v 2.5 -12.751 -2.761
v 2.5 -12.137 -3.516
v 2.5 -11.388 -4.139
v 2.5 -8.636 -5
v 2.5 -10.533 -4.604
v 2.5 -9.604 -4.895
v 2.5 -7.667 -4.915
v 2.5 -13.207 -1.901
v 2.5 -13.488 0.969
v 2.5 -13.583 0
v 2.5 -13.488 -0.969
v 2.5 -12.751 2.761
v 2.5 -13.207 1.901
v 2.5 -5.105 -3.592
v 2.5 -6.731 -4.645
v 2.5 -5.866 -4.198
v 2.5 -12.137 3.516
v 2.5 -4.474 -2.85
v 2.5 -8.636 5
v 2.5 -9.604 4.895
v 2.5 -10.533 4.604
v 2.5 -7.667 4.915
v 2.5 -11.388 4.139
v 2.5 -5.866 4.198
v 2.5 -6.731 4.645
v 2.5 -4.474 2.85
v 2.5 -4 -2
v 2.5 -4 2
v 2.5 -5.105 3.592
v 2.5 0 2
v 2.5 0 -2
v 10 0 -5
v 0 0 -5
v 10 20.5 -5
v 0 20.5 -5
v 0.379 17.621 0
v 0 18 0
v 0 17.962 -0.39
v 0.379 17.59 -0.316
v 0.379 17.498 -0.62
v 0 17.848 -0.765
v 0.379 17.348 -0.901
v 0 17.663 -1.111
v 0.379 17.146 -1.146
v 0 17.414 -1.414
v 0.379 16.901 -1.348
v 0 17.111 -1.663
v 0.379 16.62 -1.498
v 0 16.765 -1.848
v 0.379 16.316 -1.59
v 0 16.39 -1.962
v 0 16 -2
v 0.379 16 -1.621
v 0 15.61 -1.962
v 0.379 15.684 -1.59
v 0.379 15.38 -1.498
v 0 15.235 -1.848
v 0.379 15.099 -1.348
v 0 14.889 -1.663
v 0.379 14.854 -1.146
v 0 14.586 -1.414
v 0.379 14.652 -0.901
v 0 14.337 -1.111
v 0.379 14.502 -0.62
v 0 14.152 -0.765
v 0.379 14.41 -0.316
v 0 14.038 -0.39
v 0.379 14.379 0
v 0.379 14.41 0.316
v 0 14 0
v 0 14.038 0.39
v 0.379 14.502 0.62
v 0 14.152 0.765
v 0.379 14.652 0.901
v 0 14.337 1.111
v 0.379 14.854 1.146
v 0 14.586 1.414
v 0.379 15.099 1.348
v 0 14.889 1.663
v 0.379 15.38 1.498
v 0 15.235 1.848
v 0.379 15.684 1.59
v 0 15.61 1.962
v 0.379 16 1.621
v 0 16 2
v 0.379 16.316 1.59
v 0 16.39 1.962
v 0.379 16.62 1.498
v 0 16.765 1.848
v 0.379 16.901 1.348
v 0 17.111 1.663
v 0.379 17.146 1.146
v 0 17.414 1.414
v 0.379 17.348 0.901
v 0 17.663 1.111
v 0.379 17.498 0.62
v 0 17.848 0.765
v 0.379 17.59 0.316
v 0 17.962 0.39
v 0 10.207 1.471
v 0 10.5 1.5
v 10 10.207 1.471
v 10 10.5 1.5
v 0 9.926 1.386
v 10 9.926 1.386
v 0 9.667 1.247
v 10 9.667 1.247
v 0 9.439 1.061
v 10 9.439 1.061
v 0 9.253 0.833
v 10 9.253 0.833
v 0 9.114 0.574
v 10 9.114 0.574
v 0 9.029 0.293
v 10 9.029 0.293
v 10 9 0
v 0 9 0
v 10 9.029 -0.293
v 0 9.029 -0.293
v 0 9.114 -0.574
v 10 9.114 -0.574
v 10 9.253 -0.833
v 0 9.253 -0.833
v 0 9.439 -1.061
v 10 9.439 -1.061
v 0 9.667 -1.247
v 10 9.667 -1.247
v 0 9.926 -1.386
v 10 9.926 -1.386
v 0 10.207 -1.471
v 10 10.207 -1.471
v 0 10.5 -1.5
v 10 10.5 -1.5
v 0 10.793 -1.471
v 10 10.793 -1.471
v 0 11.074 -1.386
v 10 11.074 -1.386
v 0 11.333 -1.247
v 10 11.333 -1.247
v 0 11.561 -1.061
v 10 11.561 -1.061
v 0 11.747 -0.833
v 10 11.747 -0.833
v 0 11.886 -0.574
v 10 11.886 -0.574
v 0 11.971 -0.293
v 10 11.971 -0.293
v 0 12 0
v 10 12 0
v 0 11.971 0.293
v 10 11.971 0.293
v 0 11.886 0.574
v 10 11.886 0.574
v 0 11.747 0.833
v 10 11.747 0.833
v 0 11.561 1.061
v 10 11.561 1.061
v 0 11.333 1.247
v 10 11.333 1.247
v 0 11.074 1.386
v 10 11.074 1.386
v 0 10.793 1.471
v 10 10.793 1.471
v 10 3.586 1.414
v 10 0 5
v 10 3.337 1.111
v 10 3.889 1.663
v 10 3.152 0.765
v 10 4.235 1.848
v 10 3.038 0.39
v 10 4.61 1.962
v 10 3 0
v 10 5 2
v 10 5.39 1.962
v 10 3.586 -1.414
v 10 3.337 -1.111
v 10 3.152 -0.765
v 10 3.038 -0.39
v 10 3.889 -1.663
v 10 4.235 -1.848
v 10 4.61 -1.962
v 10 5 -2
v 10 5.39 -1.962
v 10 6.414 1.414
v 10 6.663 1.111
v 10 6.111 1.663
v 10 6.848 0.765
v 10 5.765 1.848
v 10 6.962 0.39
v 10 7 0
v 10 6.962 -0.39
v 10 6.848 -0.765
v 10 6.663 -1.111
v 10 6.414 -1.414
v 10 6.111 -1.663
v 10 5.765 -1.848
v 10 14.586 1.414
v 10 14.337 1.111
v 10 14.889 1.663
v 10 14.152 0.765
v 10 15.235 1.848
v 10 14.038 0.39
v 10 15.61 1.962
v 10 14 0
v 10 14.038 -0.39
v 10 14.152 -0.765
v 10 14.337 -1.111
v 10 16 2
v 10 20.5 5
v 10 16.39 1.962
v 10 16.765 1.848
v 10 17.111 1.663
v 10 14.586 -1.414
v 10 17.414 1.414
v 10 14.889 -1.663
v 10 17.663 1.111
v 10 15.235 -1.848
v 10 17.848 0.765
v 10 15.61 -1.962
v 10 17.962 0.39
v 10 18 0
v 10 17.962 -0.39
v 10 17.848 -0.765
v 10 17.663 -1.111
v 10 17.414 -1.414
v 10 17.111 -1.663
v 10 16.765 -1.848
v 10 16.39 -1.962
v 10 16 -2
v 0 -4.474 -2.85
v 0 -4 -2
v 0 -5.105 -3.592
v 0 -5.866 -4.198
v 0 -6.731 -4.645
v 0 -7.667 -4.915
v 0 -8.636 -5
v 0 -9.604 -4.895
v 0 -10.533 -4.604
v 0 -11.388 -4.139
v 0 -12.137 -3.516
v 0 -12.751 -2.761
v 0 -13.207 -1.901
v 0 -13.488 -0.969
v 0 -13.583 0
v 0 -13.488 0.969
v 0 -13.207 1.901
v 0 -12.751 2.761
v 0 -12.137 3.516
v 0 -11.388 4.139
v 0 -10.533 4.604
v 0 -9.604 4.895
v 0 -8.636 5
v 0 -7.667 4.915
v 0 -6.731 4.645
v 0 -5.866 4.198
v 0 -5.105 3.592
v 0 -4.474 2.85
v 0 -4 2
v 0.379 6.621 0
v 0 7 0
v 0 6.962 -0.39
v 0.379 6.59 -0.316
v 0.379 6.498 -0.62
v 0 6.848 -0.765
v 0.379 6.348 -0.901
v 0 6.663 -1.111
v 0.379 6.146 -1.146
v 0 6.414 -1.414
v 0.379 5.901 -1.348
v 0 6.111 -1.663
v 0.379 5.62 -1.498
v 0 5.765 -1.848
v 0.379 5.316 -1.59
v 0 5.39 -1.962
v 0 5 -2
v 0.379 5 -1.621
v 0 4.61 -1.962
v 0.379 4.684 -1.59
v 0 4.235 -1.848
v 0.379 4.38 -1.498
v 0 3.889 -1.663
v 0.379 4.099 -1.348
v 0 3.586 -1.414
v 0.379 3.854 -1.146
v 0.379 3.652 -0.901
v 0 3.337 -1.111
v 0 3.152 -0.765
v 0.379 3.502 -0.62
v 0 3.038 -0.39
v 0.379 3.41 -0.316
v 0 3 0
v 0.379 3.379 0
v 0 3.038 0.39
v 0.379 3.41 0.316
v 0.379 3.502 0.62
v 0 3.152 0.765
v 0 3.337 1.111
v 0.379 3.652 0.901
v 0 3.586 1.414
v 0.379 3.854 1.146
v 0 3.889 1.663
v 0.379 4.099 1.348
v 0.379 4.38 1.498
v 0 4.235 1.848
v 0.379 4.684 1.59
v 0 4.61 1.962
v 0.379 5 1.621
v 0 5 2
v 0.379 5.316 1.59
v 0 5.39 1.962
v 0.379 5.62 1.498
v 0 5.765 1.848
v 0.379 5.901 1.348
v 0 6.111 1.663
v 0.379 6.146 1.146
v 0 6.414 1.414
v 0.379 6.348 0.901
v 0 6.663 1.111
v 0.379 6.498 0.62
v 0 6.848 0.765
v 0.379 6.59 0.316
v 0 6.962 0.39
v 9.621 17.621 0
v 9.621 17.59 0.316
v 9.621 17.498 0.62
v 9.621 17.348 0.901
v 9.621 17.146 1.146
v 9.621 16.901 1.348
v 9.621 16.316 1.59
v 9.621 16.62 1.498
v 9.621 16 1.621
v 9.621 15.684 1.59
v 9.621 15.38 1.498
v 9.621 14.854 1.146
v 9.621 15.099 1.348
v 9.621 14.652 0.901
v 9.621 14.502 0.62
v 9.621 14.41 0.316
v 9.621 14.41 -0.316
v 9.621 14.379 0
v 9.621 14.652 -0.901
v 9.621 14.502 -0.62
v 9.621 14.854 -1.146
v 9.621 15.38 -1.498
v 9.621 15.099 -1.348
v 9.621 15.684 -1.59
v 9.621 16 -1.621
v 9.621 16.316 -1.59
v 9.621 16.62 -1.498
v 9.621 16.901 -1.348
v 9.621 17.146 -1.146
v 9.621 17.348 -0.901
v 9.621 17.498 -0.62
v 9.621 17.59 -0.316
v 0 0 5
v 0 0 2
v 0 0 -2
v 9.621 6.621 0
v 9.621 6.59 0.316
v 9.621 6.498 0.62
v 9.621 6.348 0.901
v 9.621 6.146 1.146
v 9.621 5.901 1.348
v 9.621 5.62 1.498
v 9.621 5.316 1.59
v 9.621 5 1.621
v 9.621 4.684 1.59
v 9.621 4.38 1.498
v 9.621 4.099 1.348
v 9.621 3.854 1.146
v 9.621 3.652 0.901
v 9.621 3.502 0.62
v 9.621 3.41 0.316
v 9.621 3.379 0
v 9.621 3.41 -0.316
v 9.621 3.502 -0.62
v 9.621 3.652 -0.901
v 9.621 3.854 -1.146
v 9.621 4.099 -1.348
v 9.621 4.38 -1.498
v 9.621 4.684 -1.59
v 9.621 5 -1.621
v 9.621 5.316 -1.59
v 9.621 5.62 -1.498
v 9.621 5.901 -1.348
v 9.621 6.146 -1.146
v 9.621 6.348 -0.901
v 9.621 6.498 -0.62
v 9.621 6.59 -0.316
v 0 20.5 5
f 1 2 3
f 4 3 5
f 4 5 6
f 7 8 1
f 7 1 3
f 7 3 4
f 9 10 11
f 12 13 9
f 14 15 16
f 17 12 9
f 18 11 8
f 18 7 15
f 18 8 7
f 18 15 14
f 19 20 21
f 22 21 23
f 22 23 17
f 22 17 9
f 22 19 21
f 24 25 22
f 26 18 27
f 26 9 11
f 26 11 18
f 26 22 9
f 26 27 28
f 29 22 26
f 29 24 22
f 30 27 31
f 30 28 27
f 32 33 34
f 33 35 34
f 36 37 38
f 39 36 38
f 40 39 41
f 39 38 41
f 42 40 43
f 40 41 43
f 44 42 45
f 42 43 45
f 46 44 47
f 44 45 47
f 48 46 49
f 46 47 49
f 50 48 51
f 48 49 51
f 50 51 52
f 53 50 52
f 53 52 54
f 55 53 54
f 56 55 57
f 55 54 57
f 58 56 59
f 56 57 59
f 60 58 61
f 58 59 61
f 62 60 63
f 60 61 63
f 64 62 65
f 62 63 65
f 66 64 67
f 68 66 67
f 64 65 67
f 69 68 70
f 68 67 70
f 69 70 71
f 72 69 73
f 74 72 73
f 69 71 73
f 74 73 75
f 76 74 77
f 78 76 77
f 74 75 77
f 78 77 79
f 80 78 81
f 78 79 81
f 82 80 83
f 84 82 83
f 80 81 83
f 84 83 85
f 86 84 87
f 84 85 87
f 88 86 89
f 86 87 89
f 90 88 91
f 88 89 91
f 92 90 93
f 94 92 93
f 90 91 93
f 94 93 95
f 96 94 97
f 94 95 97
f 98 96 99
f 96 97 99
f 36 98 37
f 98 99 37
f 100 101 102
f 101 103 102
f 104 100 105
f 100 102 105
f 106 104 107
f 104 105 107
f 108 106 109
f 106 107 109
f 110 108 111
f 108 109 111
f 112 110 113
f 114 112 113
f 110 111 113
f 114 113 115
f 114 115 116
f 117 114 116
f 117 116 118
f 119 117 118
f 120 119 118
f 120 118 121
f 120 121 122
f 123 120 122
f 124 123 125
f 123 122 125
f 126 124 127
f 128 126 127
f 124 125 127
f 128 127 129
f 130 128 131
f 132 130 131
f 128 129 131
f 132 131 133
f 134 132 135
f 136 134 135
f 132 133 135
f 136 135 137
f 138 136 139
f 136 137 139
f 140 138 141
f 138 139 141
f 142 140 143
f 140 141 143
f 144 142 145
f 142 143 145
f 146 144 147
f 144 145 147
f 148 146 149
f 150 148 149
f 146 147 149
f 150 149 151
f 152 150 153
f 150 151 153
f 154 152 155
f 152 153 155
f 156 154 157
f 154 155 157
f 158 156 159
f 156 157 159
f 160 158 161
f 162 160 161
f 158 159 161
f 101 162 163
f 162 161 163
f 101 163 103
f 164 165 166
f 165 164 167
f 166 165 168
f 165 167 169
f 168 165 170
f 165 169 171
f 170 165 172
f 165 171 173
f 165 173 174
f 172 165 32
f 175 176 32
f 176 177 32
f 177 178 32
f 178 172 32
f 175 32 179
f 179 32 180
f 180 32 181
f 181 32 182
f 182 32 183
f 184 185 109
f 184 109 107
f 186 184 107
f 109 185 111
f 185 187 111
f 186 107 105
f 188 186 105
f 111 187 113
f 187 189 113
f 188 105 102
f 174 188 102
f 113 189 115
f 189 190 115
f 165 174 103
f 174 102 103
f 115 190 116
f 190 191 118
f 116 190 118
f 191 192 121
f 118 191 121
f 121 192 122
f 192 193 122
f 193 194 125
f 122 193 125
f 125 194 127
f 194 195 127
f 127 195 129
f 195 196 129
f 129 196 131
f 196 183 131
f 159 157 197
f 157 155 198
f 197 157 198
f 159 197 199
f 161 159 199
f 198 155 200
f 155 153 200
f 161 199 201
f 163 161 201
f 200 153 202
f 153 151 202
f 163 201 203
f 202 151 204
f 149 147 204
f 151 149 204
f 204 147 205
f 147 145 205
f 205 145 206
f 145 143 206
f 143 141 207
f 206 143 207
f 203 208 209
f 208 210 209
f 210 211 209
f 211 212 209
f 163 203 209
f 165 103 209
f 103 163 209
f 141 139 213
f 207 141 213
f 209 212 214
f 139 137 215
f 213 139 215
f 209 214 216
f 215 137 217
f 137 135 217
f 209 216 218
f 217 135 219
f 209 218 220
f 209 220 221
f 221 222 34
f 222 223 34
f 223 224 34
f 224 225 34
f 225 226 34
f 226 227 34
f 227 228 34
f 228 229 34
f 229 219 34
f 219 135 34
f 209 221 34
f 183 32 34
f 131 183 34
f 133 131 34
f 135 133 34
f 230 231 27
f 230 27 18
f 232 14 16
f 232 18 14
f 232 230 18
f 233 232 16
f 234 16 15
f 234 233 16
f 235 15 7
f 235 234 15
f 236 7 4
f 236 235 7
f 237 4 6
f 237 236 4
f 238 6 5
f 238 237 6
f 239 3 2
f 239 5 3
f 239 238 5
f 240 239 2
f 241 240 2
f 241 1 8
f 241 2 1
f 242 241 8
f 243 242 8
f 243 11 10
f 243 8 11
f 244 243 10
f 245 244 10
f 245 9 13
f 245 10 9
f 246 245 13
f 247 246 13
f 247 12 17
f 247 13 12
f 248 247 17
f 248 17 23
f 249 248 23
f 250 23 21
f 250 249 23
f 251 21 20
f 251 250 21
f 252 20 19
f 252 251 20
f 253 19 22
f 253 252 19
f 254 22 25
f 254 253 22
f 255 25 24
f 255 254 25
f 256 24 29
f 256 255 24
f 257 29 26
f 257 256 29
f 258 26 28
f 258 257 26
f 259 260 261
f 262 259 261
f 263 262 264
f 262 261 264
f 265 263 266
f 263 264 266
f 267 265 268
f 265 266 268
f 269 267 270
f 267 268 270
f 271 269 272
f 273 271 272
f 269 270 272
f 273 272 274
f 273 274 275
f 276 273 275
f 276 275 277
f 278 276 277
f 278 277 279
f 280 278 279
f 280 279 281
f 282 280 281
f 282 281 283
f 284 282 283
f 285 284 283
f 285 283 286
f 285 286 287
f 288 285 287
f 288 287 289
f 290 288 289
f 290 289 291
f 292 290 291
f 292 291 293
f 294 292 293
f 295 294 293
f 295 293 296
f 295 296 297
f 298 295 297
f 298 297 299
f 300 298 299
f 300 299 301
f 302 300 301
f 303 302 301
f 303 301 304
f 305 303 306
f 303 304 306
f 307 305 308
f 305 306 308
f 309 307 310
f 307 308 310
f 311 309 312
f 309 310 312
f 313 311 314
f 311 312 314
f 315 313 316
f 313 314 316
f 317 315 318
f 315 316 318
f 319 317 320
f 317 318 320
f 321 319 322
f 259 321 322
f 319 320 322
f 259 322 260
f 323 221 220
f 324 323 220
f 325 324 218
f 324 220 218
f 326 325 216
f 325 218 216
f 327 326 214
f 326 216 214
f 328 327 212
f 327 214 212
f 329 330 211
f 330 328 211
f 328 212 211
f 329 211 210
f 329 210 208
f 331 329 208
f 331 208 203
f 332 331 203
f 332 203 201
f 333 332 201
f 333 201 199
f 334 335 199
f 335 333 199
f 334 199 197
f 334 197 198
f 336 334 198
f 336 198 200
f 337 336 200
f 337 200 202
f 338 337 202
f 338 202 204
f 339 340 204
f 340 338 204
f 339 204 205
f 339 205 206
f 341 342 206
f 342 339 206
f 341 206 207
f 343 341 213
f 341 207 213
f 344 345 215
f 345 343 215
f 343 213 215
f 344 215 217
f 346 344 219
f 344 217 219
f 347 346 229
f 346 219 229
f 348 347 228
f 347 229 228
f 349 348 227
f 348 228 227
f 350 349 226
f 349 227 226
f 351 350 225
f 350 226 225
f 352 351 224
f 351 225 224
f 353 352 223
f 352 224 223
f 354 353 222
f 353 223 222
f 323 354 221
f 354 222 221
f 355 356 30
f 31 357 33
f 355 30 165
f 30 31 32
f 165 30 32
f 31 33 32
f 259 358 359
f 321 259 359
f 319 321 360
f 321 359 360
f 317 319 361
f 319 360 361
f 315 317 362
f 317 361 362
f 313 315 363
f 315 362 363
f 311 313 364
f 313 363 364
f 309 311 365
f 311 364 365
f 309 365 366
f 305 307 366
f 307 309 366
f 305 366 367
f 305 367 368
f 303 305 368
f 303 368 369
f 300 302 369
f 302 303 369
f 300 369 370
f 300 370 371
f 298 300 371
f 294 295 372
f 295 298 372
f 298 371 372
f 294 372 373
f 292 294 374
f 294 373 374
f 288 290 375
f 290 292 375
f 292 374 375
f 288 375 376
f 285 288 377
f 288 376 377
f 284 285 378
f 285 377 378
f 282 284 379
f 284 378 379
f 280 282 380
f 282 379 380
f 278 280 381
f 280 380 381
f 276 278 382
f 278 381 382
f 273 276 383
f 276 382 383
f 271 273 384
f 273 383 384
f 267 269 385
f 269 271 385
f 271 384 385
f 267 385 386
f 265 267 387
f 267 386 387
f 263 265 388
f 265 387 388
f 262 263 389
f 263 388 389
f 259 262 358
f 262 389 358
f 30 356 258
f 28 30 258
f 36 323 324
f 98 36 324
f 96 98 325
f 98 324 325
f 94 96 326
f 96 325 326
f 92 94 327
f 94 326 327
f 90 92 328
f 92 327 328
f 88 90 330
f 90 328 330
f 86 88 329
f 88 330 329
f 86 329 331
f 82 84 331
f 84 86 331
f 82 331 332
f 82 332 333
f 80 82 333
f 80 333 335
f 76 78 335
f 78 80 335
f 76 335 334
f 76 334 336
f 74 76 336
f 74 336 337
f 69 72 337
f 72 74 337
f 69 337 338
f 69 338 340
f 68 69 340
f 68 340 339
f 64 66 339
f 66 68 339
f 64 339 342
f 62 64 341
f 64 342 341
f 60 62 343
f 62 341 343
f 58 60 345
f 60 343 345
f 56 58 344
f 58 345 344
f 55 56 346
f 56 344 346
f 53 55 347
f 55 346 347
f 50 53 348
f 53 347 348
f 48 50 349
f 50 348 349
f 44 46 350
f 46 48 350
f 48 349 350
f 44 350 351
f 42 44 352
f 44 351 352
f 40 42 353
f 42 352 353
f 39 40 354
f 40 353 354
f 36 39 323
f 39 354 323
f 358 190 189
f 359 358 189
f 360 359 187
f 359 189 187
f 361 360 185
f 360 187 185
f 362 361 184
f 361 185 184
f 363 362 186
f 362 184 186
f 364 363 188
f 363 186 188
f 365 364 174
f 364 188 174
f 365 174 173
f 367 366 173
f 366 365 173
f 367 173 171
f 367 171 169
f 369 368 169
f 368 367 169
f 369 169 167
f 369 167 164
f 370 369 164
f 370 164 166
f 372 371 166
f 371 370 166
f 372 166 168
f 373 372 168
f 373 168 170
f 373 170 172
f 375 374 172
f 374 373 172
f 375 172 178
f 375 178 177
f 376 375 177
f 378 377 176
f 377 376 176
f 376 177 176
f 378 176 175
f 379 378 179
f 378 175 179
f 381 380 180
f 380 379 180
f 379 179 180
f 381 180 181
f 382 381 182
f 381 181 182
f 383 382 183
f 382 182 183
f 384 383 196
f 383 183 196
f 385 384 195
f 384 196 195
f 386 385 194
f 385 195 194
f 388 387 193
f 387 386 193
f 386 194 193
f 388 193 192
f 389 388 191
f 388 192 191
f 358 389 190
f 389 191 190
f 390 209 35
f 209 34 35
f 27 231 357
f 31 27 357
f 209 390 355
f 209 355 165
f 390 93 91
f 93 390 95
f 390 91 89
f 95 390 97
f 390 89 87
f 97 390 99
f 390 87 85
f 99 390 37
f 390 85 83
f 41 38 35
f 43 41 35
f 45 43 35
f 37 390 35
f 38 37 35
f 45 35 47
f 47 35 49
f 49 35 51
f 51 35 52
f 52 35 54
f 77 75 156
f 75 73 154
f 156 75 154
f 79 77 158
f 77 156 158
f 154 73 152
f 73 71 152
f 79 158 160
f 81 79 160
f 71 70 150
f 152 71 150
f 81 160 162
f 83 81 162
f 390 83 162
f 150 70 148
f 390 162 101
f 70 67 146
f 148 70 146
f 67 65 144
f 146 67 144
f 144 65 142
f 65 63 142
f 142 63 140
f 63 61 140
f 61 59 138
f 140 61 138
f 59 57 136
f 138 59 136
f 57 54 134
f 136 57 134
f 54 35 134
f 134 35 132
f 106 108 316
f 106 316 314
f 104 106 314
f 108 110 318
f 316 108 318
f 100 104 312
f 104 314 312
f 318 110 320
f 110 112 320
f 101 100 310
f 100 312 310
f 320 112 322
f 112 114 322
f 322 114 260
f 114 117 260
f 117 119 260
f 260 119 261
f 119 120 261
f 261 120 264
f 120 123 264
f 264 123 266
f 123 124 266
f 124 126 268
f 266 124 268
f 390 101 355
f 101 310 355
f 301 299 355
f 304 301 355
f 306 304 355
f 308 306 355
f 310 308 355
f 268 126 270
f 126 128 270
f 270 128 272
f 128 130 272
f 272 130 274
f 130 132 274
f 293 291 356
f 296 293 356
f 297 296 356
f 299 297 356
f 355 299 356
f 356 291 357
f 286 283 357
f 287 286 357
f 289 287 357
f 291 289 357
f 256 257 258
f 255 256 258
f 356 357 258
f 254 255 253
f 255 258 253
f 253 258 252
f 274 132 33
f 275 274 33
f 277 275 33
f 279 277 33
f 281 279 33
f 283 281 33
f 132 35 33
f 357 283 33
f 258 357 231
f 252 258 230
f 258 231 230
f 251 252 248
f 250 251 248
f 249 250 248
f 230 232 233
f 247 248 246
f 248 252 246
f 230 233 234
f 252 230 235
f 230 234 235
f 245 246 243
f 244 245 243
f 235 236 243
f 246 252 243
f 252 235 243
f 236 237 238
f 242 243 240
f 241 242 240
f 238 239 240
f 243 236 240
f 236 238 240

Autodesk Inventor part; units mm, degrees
sketch "Sketch_11" plane through (0, 0, 0) normal (0, 0, 1) x (1, 0, 0)
  line L0 (0, 0) -> (10, 0)
  line L1 (10, 0) -> (10, 20.5)
  line L2 (10, 20.5) -> (0, 20.5)
  line L3 (0, 20.5) -> (0, 0)
extrude "Extrusion1" add sketch "Sketch_11" along normal mid plane 10
sketch "Sketch2" plane through (0, 0, 5) normal (-1, 0, 0) x (0, 0, 1)
  point P0 (-5, 10.5)
hole "Hole1" at (0, 10.5, 0) direction (1, 0, 0) diameter 3 depth 10
sketch "Sketch_16" plane through (0, 0, 0) normal (0, 0, 1) x (1, 0, 0)
  line L0 (10, 5) -> (0, 5)
  line L1 (0, 5) -> (0, 7)
  line L2 (0, 7) -> (0.379, 6.621)
  line L3 (0.379, 6.621) -> (9.621, 6.621)
  line L4 (9.621, 6.621) -> (10, 7)
  line L5 (10, 7) -> (10, 5)
  line L6 (10, 5) -> (0, 5)
revolve "Revolution1" cut sketch "Sketch_16" angle 360 about axis through (10, 5, 0) along (-1, 0, 0)
thread "Thread1" size "M4x0.7" class "6H" standard "ISO Metric profile" full length
sketch "Sketch_17" plane through (0, 0, 0) normal (0, 0, 1) x (1, 0, 0)
  line L0 (10, 16) -> (0, 16)
  line L1 (0, 16) -> (0, 18)
  line L2 (0, 18) -> (0.379, 17.621)
  line L3 (0.379, 17.621) -> (9.621, 17.621)
  line L4 (9.621, 17.621) -> (10, 18)
  line L5 (10, 18) -> (10, 16)
  line L6 (10, 16) -> (0, 16)
revolve "Revolution2" cut sketch "Sketch_17" angle 360 about axis through (10, 16, 0) along (-1, 0, 0)
thread "Thread2" size "M4x0.7" class "6H" standard "ISO Metric profile" full length
sketch "Sketch_1" plane through (0, 0, 0) normal (1, 0, 0) x (0, 1, 0)
  arc A0 (-4, 2) -> (-4, -2) centre (-8.5826, 0) ccw
  line L0 (-4, -2) -> (0, -2)
  line L1 (0, -2) -> (0, 2)
  line L2 (0, 2) -> (-4, 2)
extrude "Extrusion2" add sketch "Sketch_1" along normal blind 2.5
ref_plane "ANBAU_XY" through (0, 0, 0) normal (-1, 0, 0) x (0, 0, -1)
ref_plane "ANBAU_YZ" through (0, 0, 0) normal (0, 0, -1) x (0, -1, 0)
ref_plane "ANBAU_ZX" through (0, 0, 0) normal (0, -1, 0) x (-1, 0, 0)
properties part number "HGP-16---(116_JAW)"
